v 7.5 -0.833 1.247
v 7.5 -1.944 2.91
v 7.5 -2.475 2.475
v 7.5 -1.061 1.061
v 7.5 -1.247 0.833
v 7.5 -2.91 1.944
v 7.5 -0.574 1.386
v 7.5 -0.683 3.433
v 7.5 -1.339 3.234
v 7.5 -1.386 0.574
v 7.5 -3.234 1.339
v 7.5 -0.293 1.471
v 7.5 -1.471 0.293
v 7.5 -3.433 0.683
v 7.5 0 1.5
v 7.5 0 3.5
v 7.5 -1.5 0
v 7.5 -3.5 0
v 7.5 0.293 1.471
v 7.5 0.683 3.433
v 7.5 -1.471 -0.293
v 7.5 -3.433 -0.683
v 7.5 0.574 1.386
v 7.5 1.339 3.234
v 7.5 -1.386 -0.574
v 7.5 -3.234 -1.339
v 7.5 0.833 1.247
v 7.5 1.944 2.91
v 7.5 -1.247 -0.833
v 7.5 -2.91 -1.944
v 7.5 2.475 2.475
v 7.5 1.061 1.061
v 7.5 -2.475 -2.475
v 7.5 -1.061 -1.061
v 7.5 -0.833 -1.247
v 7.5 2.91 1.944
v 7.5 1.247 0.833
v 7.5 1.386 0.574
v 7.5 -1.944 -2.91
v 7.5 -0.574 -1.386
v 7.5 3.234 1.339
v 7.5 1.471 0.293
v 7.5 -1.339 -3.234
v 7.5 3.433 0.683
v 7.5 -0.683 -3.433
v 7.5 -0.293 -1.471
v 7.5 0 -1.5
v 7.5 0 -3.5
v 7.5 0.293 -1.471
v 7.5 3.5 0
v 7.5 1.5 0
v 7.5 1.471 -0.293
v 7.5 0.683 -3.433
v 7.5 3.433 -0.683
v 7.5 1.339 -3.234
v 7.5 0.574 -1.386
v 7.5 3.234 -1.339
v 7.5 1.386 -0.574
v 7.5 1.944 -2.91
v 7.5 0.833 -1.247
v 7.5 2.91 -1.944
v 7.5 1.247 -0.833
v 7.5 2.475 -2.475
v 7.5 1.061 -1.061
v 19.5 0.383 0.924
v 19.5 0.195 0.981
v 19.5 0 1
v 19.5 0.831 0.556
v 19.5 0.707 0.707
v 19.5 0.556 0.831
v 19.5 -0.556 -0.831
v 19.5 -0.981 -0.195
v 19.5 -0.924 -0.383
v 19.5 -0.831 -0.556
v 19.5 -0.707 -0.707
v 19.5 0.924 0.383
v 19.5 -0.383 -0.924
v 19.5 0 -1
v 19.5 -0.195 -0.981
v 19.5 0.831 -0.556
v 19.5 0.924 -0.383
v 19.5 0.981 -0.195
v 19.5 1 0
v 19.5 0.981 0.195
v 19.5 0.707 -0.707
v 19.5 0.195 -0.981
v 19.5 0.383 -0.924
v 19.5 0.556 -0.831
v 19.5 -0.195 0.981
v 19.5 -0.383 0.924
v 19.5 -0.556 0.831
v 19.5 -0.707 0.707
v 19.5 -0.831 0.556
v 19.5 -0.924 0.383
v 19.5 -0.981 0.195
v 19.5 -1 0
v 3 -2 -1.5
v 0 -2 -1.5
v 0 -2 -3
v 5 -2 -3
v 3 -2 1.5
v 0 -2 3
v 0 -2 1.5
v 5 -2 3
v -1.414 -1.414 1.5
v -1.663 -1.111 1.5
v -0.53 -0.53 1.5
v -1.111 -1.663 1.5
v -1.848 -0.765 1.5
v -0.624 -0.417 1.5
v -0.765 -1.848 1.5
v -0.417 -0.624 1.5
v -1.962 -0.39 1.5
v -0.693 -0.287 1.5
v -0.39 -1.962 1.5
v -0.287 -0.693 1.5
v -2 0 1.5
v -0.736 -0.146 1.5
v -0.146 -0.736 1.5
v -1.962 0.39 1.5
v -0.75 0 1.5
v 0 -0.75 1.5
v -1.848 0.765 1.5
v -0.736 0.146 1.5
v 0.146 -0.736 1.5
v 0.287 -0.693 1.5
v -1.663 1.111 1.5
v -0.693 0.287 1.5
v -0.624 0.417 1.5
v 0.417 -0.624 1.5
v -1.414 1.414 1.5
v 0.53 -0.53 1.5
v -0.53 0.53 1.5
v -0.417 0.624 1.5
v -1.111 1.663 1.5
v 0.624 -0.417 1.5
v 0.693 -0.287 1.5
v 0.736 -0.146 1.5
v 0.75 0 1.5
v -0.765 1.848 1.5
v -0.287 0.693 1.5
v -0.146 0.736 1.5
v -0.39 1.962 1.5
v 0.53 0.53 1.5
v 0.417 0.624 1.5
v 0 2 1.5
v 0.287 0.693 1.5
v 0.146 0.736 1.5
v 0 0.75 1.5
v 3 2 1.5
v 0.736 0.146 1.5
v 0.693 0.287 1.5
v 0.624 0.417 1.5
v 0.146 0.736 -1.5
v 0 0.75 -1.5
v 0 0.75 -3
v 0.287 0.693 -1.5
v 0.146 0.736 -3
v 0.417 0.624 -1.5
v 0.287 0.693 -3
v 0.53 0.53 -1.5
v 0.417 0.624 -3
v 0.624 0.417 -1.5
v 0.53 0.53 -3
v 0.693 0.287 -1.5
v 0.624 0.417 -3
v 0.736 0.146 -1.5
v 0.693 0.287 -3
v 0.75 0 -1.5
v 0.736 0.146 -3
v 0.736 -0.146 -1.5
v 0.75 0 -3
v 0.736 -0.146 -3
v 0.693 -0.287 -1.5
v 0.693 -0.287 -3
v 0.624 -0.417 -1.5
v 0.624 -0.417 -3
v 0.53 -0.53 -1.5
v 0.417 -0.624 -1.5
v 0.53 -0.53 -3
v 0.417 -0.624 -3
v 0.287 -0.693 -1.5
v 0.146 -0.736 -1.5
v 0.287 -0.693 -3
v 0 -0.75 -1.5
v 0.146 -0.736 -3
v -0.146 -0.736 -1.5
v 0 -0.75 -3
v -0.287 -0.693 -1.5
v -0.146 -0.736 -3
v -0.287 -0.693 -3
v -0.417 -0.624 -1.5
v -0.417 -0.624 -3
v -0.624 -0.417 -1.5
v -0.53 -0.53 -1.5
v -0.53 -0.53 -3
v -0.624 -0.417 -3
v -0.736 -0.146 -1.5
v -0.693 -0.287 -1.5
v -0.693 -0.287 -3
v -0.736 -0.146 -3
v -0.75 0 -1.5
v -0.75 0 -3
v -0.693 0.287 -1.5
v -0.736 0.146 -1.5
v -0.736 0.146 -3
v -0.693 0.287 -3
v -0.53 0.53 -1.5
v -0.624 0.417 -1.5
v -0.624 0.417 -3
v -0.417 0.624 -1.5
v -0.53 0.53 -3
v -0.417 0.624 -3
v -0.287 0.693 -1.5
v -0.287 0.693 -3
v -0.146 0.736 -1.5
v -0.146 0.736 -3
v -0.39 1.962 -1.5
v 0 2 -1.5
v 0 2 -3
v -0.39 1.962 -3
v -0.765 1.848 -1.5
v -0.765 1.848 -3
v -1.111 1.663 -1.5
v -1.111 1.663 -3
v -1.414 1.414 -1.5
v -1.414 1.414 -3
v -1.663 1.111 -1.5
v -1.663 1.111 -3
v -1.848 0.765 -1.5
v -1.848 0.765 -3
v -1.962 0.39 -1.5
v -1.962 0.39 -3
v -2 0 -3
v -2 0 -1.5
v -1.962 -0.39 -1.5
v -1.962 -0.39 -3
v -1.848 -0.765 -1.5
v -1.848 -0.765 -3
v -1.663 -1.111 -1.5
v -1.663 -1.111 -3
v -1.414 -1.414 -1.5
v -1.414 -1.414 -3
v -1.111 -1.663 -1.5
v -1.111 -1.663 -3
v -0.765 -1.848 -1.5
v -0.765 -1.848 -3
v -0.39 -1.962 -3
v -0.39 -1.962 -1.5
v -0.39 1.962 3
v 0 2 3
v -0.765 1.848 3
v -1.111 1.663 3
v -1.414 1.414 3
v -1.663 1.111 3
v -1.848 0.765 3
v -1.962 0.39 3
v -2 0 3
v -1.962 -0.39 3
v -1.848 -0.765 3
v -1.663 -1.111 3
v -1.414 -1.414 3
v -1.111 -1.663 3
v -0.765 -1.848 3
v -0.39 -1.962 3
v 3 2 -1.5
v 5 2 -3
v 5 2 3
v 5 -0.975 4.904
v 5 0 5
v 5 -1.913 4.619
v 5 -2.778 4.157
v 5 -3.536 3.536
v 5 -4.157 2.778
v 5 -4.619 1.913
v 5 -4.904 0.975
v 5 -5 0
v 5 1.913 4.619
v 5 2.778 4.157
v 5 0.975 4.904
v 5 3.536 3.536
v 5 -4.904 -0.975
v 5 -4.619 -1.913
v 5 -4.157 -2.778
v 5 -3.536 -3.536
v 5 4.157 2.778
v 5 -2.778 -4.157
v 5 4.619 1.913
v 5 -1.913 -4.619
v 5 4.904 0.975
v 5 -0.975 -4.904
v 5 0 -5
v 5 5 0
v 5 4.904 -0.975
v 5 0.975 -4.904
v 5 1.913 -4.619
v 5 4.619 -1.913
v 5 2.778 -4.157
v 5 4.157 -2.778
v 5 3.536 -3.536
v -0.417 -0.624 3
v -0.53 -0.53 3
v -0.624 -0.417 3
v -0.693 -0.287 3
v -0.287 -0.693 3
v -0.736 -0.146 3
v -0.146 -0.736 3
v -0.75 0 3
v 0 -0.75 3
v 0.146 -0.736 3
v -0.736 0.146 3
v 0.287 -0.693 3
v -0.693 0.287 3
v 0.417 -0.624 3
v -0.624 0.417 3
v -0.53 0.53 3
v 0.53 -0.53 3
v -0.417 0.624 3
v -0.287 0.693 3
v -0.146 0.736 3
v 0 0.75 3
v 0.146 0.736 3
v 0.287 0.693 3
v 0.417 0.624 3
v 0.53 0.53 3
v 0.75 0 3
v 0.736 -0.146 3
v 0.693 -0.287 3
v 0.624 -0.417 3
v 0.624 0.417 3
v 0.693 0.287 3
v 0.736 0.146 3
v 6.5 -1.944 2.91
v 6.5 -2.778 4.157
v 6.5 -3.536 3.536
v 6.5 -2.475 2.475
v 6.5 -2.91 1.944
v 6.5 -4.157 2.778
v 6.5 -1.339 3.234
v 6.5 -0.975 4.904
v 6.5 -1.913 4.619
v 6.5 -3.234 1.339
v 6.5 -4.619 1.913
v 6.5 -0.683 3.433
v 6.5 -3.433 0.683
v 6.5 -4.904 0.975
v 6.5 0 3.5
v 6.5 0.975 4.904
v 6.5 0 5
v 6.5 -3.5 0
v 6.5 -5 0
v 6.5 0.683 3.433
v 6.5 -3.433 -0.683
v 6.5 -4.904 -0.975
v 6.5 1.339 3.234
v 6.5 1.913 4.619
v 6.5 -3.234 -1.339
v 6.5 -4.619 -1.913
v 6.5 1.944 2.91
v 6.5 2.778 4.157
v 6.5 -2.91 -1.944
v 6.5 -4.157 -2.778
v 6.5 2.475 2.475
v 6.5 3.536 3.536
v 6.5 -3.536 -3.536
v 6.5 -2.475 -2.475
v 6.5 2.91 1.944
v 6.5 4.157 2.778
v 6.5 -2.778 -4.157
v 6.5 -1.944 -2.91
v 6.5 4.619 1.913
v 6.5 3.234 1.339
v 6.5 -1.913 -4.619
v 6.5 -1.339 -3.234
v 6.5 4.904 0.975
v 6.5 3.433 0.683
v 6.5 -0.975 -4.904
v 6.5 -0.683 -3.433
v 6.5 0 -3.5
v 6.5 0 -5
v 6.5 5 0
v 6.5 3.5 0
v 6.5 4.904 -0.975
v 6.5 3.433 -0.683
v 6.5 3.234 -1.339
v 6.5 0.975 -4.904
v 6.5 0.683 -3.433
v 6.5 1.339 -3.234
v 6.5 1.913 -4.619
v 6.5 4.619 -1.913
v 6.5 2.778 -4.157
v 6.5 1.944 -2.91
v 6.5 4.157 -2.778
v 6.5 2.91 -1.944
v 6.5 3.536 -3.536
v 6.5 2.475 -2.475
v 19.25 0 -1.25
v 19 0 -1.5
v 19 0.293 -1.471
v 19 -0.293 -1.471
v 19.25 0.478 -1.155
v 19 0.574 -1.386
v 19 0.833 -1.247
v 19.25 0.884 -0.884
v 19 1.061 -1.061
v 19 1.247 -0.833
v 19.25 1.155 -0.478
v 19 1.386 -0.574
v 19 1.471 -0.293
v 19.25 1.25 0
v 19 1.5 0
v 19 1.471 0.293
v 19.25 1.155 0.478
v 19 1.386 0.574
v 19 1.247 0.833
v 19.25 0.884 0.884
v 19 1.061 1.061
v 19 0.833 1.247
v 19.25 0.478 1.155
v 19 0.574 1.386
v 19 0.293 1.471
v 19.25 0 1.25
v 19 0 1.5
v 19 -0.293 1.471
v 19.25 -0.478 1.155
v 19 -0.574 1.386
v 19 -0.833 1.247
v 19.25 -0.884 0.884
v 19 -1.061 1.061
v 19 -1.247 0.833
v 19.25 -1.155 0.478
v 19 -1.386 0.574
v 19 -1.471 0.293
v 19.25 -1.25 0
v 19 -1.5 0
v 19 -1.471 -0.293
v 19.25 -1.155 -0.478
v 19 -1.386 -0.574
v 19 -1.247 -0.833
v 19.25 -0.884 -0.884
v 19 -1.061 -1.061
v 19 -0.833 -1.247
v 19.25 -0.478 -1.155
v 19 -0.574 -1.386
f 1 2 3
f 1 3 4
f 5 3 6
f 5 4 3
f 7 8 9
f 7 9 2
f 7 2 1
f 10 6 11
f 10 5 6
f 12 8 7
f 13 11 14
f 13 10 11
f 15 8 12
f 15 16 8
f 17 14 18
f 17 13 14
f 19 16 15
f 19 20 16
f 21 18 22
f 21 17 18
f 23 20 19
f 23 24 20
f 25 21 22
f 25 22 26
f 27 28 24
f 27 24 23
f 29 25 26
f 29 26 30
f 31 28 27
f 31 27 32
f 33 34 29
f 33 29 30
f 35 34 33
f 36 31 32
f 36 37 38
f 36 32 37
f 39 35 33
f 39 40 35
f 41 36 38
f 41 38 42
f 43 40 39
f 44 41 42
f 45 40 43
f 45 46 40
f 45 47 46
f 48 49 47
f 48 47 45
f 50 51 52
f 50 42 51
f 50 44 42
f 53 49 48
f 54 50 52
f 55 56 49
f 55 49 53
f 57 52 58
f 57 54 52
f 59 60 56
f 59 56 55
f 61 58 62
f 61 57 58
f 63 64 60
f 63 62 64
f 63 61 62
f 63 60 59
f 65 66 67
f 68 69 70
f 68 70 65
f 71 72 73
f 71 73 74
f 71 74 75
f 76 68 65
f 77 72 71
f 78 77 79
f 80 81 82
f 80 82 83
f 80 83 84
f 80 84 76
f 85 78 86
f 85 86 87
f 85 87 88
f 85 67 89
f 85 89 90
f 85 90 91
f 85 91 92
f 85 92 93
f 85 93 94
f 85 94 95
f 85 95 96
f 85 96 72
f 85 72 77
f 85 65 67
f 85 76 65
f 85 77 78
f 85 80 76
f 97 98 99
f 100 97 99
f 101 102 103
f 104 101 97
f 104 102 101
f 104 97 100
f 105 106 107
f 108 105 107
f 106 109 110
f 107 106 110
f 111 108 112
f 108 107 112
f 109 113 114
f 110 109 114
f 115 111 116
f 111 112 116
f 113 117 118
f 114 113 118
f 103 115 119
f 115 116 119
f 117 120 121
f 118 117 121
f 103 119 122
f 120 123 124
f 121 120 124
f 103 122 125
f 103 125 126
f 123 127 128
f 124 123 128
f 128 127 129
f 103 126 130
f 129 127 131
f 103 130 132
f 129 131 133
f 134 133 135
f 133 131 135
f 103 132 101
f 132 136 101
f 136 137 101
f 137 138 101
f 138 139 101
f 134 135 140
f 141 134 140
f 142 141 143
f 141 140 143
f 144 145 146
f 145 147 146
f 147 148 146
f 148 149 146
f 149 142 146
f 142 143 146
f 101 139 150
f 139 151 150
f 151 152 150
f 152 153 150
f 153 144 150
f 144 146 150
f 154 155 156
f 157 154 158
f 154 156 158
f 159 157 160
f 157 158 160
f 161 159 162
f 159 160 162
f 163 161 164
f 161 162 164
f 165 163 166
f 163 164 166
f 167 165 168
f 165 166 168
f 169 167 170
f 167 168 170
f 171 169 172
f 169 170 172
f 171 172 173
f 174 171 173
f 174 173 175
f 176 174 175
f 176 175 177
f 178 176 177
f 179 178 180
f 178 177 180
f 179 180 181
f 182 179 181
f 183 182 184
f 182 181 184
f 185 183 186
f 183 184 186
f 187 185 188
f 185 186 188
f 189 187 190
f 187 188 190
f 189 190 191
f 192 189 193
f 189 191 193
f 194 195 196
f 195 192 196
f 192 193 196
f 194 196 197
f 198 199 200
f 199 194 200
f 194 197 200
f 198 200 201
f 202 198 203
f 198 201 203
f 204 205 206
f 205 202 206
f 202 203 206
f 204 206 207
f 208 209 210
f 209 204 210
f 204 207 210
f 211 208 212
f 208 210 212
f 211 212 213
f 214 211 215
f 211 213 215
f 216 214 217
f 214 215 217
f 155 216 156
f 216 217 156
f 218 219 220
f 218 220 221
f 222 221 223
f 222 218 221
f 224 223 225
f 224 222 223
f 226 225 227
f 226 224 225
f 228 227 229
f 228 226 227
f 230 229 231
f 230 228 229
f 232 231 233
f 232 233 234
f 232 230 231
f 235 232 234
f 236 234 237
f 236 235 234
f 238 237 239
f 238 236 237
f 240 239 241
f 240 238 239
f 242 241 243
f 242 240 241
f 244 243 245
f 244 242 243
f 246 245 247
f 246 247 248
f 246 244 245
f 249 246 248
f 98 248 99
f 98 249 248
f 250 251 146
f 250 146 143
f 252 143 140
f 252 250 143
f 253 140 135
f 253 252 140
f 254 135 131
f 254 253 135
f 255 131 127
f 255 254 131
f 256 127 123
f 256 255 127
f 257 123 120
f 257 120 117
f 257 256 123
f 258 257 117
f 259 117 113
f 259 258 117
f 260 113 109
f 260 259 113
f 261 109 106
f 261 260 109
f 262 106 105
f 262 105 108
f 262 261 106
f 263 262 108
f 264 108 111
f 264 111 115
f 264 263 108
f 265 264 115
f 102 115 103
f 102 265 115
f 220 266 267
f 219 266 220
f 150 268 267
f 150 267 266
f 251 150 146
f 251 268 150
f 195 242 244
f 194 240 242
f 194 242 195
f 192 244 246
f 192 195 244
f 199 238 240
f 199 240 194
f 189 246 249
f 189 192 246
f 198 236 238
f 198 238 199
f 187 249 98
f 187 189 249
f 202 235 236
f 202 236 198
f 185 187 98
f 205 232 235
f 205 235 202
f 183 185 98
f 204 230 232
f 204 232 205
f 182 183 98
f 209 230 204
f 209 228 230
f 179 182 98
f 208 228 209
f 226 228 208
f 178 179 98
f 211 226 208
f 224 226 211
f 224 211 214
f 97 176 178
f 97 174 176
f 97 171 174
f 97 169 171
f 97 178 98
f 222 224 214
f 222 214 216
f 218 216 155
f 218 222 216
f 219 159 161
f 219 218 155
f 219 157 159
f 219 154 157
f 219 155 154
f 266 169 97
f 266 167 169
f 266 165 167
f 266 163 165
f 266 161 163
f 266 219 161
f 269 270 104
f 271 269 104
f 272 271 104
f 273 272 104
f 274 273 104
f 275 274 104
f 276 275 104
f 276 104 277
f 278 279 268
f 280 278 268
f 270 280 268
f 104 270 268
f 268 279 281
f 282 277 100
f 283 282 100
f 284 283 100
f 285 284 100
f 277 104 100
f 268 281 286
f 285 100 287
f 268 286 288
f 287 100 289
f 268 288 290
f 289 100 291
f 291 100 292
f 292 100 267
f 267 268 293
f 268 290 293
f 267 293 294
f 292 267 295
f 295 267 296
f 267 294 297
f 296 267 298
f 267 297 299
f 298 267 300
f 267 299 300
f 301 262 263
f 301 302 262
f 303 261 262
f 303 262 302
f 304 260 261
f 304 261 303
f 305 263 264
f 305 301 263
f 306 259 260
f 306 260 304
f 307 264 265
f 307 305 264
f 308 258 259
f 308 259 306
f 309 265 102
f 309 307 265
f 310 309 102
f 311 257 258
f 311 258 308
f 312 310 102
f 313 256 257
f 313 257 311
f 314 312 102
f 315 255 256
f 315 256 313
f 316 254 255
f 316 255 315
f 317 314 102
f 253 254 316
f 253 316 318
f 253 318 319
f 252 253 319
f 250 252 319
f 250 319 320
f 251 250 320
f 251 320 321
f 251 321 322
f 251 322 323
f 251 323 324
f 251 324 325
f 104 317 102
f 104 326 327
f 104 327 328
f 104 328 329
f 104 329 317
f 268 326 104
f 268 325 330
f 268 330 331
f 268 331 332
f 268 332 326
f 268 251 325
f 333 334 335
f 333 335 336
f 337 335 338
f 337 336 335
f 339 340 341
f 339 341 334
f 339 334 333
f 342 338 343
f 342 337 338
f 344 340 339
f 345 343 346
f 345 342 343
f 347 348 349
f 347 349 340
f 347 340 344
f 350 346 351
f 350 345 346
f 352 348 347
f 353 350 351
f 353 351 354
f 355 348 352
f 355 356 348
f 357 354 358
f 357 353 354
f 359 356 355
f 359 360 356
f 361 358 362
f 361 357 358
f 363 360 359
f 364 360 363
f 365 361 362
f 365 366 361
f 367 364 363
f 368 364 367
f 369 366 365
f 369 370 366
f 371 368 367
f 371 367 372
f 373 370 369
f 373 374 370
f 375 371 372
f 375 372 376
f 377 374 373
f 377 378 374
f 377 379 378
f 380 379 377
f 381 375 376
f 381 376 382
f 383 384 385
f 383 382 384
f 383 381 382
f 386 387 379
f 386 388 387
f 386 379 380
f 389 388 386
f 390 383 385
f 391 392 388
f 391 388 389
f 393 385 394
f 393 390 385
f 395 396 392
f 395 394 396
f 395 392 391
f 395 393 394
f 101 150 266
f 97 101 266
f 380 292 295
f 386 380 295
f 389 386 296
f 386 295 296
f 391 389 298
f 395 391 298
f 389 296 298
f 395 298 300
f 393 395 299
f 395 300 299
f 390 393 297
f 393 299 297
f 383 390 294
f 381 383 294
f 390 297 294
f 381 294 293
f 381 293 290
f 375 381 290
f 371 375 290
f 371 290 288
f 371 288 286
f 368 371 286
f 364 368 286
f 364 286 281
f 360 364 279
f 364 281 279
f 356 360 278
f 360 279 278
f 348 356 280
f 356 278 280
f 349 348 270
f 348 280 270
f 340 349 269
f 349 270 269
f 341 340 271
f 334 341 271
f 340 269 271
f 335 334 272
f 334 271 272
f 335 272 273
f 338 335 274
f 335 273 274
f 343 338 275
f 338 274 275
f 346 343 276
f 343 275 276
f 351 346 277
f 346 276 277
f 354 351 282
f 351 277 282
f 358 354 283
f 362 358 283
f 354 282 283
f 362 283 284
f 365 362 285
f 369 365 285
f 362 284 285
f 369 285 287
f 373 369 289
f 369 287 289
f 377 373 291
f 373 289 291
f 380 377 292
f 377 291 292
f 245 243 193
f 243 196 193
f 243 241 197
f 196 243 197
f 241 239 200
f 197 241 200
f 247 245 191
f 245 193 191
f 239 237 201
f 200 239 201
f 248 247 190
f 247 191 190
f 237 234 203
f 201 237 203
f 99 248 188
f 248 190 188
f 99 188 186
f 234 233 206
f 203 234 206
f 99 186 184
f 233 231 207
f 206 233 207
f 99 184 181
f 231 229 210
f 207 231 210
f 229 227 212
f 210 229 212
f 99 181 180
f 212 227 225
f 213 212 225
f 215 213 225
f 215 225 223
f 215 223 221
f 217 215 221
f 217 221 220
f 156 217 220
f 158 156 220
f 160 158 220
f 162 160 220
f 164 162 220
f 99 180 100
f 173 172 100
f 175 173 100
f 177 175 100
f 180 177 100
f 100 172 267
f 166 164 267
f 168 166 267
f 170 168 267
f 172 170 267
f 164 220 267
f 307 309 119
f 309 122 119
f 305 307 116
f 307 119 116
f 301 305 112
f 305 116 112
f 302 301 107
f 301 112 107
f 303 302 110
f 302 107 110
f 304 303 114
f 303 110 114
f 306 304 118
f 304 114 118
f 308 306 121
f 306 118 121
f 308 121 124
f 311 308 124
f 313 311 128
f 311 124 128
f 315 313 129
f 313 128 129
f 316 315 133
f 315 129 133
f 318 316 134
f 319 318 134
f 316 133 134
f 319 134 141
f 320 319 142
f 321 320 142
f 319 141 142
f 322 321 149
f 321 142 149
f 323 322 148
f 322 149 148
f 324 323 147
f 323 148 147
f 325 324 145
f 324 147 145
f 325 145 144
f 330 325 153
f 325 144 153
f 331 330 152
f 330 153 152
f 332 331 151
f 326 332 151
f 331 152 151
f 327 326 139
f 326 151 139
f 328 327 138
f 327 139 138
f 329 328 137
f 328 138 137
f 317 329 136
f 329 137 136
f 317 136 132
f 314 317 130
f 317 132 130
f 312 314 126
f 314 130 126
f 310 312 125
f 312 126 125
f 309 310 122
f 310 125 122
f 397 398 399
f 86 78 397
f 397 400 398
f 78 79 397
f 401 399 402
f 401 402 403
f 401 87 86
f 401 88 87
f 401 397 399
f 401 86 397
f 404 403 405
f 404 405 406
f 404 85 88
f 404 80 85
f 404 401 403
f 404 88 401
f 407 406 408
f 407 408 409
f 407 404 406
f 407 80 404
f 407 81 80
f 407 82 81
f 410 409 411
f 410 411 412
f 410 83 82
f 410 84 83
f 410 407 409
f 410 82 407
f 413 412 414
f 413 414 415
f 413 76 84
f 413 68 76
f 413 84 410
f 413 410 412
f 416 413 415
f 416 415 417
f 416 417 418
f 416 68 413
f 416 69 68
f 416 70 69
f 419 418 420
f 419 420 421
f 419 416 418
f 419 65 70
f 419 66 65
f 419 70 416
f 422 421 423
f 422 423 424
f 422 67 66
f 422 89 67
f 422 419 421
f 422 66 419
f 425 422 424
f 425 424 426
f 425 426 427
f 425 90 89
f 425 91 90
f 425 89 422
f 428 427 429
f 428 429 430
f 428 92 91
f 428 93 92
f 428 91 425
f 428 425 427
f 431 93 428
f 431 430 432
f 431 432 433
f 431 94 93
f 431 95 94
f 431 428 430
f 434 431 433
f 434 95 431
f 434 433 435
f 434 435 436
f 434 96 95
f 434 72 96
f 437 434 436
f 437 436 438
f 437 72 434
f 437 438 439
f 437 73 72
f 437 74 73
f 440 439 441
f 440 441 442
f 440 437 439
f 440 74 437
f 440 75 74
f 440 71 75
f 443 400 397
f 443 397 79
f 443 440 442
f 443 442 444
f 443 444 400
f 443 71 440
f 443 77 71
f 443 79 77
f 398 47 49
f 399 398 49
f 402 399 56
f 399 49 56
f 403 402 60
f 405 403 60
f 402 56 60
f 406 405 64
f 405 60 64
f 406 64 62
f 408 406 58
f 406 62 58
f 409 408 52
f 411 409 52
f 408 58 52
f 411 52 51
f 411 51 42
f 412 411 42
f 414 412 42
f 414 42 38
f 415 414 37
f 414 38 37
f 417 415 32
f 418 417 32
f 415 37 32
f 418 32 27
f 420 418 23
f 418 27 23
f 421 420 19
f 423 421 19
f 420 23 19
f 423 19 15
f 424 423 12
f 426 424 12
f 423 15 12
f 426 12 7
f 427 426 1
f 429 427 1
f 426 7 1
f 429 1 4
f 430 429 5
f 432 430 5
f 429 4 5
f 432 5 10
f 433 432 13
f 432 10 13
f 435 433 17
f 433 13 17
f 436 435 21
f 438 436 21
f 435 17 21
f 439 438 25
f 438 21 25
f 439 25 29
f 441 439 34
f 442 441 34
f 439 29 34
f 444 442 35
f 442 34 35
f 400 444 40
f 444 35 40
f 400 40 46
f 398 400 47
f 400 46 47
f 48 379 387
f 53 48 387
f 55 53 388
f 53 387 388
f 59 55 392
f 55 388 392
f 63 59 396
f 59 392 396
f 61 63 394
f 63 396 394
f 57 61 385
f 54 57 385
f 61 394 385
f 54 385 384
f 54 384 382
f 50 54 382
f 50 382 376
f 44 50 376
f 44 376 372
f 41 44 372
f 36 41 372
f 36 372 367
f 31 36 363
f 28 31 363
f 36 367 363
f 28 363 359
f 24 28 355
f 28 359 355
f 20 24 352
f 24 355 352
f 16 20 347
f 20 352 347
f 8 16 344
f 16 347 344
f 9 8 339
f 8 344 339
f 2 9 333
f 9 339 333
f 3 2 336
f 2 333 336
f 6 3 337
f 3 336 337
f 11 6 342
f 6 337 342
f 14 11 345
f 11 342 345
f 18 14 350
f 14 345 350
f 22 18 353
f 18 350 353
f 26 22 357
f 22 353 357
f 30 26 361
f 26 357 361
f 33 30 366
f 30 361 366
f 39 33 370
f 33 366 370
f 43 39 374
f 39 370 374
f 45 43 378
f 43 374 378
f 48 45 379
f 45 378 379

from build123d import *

# Parameters (mm, degrees)
EXTRUDE_1_DEPTH     = 3
SKETCH_2_R          = 5
EXTRUDE_2_DEPTH     = 1.5
SKETCH_3_R          = 3.5
EXTRUDE_3_DEPTH     = 1
SKETCH_4_R          = 1.5
EXTRUDE_4_DEPTH     = 12
SKETCH_5_W          = 10
SKETCH_5_H          = 3
CUT_EXTRUDE_1_DEPTH = 22.313141486
CHAMFER_1_SIZE      = 0.5


with BuildPart() as part:
    # 草图1 → 凸台-拉伸1 (new, symmetric)
    with BuildSketch(Plane.XY):
        with BuildLine():
            Line((5, 2), (0, 2))
            ThreePointArc((0, 2), (1.414213562, 1.414213562), (2, 0))
            ThreePointArc((2, 0), (1.414213562, -1.414213562), (0, -2))
            Line((0, -2), (5, -2))
            Line((5, -2), (5, 2))
        make_face()
        with BuildLine():
            ThreePointArc((2, 0), (1.414213562, 1.414213562), (0, 2))
            Line((0, 2), (0, 0.75))
            ThreePointArc((0, 0.75), (0.530330086, 0.530330086), (0.75, 0))
            ThreePointArc((0.75, 0), (0.530330086, -0.530330086), (0, -0.75))
            Line((0, -0.75), (0, -2))
            ThreePointArc((0, -2), (1.414213562, -1.414213562), (2, 0))
        make_face()
        with BuildLine():
            Line((0, 0.75), (0, 2))
            ThreePointArc((0, 2), (-2, 0), (0, -2))
            Line((0, -2), (0, -0.75))
            ThreePointArc((0, -0.75), (-0.75, 0), (0, 0.75))
        make_face()
    extrude(amount=EXTRUDE_1_DEPTH, both=True)

    # 草图2 → 凸台-拉伸2 (add)
    with BuildSketch(Plane(origin=(5, 0, 0), x_dir=(0, 0, -1), z_dir=(1, 0, 0))):
        Circle(SKETCH_2_R)
    extrude(amount=EXTRUDE_2_DEPTH)

    # 草图3 → 凸台-拉伸3 (add)
    with BuildSketch(Plane(origin=(6.5, 0, 0), x_dir=(0, 0, -1), z_dir=(1, 0, 0))):
        Circle(SKETCH_3_R)
    extrude(amount=EXTRUDE_3_DEPTH)

    # 草图4 → 凸台-拉伸4 (add)
    with BuildSketch(Plane(origin=(7.5, 0, 0), x_dir=(0, 0, -1), z_dir=(1, 0, 0))):
        Circle(SKETCH_4_R)
    extrude(amount=EXTRUDE_4_DEPTH)

    # 草图5 → 切除-拉伸1 (cut, through all)
    with BuildSketch(Plane(origin=(0, 2, 0), x_dir=(1, 0, 0), z_dir=(0, 1, 0))):
        with Locations((-2, 0)):
            Rectangle(SKETCH_5_W, SKETCH_5_H)
    extrude(amount=-CUT_EXTRUDE_1_DEPTH, mode=Mode.SUBTRACT)

    # 倒角1
    chamfer_1_edges = [part.edges().sort_by_distance(p)[0] for p in [
        (19.5, 0, 1.5),
    ]]
    chamfer(chamfer_1_edges, length=CHAMFER_1_SIZE)


solid = part.part
